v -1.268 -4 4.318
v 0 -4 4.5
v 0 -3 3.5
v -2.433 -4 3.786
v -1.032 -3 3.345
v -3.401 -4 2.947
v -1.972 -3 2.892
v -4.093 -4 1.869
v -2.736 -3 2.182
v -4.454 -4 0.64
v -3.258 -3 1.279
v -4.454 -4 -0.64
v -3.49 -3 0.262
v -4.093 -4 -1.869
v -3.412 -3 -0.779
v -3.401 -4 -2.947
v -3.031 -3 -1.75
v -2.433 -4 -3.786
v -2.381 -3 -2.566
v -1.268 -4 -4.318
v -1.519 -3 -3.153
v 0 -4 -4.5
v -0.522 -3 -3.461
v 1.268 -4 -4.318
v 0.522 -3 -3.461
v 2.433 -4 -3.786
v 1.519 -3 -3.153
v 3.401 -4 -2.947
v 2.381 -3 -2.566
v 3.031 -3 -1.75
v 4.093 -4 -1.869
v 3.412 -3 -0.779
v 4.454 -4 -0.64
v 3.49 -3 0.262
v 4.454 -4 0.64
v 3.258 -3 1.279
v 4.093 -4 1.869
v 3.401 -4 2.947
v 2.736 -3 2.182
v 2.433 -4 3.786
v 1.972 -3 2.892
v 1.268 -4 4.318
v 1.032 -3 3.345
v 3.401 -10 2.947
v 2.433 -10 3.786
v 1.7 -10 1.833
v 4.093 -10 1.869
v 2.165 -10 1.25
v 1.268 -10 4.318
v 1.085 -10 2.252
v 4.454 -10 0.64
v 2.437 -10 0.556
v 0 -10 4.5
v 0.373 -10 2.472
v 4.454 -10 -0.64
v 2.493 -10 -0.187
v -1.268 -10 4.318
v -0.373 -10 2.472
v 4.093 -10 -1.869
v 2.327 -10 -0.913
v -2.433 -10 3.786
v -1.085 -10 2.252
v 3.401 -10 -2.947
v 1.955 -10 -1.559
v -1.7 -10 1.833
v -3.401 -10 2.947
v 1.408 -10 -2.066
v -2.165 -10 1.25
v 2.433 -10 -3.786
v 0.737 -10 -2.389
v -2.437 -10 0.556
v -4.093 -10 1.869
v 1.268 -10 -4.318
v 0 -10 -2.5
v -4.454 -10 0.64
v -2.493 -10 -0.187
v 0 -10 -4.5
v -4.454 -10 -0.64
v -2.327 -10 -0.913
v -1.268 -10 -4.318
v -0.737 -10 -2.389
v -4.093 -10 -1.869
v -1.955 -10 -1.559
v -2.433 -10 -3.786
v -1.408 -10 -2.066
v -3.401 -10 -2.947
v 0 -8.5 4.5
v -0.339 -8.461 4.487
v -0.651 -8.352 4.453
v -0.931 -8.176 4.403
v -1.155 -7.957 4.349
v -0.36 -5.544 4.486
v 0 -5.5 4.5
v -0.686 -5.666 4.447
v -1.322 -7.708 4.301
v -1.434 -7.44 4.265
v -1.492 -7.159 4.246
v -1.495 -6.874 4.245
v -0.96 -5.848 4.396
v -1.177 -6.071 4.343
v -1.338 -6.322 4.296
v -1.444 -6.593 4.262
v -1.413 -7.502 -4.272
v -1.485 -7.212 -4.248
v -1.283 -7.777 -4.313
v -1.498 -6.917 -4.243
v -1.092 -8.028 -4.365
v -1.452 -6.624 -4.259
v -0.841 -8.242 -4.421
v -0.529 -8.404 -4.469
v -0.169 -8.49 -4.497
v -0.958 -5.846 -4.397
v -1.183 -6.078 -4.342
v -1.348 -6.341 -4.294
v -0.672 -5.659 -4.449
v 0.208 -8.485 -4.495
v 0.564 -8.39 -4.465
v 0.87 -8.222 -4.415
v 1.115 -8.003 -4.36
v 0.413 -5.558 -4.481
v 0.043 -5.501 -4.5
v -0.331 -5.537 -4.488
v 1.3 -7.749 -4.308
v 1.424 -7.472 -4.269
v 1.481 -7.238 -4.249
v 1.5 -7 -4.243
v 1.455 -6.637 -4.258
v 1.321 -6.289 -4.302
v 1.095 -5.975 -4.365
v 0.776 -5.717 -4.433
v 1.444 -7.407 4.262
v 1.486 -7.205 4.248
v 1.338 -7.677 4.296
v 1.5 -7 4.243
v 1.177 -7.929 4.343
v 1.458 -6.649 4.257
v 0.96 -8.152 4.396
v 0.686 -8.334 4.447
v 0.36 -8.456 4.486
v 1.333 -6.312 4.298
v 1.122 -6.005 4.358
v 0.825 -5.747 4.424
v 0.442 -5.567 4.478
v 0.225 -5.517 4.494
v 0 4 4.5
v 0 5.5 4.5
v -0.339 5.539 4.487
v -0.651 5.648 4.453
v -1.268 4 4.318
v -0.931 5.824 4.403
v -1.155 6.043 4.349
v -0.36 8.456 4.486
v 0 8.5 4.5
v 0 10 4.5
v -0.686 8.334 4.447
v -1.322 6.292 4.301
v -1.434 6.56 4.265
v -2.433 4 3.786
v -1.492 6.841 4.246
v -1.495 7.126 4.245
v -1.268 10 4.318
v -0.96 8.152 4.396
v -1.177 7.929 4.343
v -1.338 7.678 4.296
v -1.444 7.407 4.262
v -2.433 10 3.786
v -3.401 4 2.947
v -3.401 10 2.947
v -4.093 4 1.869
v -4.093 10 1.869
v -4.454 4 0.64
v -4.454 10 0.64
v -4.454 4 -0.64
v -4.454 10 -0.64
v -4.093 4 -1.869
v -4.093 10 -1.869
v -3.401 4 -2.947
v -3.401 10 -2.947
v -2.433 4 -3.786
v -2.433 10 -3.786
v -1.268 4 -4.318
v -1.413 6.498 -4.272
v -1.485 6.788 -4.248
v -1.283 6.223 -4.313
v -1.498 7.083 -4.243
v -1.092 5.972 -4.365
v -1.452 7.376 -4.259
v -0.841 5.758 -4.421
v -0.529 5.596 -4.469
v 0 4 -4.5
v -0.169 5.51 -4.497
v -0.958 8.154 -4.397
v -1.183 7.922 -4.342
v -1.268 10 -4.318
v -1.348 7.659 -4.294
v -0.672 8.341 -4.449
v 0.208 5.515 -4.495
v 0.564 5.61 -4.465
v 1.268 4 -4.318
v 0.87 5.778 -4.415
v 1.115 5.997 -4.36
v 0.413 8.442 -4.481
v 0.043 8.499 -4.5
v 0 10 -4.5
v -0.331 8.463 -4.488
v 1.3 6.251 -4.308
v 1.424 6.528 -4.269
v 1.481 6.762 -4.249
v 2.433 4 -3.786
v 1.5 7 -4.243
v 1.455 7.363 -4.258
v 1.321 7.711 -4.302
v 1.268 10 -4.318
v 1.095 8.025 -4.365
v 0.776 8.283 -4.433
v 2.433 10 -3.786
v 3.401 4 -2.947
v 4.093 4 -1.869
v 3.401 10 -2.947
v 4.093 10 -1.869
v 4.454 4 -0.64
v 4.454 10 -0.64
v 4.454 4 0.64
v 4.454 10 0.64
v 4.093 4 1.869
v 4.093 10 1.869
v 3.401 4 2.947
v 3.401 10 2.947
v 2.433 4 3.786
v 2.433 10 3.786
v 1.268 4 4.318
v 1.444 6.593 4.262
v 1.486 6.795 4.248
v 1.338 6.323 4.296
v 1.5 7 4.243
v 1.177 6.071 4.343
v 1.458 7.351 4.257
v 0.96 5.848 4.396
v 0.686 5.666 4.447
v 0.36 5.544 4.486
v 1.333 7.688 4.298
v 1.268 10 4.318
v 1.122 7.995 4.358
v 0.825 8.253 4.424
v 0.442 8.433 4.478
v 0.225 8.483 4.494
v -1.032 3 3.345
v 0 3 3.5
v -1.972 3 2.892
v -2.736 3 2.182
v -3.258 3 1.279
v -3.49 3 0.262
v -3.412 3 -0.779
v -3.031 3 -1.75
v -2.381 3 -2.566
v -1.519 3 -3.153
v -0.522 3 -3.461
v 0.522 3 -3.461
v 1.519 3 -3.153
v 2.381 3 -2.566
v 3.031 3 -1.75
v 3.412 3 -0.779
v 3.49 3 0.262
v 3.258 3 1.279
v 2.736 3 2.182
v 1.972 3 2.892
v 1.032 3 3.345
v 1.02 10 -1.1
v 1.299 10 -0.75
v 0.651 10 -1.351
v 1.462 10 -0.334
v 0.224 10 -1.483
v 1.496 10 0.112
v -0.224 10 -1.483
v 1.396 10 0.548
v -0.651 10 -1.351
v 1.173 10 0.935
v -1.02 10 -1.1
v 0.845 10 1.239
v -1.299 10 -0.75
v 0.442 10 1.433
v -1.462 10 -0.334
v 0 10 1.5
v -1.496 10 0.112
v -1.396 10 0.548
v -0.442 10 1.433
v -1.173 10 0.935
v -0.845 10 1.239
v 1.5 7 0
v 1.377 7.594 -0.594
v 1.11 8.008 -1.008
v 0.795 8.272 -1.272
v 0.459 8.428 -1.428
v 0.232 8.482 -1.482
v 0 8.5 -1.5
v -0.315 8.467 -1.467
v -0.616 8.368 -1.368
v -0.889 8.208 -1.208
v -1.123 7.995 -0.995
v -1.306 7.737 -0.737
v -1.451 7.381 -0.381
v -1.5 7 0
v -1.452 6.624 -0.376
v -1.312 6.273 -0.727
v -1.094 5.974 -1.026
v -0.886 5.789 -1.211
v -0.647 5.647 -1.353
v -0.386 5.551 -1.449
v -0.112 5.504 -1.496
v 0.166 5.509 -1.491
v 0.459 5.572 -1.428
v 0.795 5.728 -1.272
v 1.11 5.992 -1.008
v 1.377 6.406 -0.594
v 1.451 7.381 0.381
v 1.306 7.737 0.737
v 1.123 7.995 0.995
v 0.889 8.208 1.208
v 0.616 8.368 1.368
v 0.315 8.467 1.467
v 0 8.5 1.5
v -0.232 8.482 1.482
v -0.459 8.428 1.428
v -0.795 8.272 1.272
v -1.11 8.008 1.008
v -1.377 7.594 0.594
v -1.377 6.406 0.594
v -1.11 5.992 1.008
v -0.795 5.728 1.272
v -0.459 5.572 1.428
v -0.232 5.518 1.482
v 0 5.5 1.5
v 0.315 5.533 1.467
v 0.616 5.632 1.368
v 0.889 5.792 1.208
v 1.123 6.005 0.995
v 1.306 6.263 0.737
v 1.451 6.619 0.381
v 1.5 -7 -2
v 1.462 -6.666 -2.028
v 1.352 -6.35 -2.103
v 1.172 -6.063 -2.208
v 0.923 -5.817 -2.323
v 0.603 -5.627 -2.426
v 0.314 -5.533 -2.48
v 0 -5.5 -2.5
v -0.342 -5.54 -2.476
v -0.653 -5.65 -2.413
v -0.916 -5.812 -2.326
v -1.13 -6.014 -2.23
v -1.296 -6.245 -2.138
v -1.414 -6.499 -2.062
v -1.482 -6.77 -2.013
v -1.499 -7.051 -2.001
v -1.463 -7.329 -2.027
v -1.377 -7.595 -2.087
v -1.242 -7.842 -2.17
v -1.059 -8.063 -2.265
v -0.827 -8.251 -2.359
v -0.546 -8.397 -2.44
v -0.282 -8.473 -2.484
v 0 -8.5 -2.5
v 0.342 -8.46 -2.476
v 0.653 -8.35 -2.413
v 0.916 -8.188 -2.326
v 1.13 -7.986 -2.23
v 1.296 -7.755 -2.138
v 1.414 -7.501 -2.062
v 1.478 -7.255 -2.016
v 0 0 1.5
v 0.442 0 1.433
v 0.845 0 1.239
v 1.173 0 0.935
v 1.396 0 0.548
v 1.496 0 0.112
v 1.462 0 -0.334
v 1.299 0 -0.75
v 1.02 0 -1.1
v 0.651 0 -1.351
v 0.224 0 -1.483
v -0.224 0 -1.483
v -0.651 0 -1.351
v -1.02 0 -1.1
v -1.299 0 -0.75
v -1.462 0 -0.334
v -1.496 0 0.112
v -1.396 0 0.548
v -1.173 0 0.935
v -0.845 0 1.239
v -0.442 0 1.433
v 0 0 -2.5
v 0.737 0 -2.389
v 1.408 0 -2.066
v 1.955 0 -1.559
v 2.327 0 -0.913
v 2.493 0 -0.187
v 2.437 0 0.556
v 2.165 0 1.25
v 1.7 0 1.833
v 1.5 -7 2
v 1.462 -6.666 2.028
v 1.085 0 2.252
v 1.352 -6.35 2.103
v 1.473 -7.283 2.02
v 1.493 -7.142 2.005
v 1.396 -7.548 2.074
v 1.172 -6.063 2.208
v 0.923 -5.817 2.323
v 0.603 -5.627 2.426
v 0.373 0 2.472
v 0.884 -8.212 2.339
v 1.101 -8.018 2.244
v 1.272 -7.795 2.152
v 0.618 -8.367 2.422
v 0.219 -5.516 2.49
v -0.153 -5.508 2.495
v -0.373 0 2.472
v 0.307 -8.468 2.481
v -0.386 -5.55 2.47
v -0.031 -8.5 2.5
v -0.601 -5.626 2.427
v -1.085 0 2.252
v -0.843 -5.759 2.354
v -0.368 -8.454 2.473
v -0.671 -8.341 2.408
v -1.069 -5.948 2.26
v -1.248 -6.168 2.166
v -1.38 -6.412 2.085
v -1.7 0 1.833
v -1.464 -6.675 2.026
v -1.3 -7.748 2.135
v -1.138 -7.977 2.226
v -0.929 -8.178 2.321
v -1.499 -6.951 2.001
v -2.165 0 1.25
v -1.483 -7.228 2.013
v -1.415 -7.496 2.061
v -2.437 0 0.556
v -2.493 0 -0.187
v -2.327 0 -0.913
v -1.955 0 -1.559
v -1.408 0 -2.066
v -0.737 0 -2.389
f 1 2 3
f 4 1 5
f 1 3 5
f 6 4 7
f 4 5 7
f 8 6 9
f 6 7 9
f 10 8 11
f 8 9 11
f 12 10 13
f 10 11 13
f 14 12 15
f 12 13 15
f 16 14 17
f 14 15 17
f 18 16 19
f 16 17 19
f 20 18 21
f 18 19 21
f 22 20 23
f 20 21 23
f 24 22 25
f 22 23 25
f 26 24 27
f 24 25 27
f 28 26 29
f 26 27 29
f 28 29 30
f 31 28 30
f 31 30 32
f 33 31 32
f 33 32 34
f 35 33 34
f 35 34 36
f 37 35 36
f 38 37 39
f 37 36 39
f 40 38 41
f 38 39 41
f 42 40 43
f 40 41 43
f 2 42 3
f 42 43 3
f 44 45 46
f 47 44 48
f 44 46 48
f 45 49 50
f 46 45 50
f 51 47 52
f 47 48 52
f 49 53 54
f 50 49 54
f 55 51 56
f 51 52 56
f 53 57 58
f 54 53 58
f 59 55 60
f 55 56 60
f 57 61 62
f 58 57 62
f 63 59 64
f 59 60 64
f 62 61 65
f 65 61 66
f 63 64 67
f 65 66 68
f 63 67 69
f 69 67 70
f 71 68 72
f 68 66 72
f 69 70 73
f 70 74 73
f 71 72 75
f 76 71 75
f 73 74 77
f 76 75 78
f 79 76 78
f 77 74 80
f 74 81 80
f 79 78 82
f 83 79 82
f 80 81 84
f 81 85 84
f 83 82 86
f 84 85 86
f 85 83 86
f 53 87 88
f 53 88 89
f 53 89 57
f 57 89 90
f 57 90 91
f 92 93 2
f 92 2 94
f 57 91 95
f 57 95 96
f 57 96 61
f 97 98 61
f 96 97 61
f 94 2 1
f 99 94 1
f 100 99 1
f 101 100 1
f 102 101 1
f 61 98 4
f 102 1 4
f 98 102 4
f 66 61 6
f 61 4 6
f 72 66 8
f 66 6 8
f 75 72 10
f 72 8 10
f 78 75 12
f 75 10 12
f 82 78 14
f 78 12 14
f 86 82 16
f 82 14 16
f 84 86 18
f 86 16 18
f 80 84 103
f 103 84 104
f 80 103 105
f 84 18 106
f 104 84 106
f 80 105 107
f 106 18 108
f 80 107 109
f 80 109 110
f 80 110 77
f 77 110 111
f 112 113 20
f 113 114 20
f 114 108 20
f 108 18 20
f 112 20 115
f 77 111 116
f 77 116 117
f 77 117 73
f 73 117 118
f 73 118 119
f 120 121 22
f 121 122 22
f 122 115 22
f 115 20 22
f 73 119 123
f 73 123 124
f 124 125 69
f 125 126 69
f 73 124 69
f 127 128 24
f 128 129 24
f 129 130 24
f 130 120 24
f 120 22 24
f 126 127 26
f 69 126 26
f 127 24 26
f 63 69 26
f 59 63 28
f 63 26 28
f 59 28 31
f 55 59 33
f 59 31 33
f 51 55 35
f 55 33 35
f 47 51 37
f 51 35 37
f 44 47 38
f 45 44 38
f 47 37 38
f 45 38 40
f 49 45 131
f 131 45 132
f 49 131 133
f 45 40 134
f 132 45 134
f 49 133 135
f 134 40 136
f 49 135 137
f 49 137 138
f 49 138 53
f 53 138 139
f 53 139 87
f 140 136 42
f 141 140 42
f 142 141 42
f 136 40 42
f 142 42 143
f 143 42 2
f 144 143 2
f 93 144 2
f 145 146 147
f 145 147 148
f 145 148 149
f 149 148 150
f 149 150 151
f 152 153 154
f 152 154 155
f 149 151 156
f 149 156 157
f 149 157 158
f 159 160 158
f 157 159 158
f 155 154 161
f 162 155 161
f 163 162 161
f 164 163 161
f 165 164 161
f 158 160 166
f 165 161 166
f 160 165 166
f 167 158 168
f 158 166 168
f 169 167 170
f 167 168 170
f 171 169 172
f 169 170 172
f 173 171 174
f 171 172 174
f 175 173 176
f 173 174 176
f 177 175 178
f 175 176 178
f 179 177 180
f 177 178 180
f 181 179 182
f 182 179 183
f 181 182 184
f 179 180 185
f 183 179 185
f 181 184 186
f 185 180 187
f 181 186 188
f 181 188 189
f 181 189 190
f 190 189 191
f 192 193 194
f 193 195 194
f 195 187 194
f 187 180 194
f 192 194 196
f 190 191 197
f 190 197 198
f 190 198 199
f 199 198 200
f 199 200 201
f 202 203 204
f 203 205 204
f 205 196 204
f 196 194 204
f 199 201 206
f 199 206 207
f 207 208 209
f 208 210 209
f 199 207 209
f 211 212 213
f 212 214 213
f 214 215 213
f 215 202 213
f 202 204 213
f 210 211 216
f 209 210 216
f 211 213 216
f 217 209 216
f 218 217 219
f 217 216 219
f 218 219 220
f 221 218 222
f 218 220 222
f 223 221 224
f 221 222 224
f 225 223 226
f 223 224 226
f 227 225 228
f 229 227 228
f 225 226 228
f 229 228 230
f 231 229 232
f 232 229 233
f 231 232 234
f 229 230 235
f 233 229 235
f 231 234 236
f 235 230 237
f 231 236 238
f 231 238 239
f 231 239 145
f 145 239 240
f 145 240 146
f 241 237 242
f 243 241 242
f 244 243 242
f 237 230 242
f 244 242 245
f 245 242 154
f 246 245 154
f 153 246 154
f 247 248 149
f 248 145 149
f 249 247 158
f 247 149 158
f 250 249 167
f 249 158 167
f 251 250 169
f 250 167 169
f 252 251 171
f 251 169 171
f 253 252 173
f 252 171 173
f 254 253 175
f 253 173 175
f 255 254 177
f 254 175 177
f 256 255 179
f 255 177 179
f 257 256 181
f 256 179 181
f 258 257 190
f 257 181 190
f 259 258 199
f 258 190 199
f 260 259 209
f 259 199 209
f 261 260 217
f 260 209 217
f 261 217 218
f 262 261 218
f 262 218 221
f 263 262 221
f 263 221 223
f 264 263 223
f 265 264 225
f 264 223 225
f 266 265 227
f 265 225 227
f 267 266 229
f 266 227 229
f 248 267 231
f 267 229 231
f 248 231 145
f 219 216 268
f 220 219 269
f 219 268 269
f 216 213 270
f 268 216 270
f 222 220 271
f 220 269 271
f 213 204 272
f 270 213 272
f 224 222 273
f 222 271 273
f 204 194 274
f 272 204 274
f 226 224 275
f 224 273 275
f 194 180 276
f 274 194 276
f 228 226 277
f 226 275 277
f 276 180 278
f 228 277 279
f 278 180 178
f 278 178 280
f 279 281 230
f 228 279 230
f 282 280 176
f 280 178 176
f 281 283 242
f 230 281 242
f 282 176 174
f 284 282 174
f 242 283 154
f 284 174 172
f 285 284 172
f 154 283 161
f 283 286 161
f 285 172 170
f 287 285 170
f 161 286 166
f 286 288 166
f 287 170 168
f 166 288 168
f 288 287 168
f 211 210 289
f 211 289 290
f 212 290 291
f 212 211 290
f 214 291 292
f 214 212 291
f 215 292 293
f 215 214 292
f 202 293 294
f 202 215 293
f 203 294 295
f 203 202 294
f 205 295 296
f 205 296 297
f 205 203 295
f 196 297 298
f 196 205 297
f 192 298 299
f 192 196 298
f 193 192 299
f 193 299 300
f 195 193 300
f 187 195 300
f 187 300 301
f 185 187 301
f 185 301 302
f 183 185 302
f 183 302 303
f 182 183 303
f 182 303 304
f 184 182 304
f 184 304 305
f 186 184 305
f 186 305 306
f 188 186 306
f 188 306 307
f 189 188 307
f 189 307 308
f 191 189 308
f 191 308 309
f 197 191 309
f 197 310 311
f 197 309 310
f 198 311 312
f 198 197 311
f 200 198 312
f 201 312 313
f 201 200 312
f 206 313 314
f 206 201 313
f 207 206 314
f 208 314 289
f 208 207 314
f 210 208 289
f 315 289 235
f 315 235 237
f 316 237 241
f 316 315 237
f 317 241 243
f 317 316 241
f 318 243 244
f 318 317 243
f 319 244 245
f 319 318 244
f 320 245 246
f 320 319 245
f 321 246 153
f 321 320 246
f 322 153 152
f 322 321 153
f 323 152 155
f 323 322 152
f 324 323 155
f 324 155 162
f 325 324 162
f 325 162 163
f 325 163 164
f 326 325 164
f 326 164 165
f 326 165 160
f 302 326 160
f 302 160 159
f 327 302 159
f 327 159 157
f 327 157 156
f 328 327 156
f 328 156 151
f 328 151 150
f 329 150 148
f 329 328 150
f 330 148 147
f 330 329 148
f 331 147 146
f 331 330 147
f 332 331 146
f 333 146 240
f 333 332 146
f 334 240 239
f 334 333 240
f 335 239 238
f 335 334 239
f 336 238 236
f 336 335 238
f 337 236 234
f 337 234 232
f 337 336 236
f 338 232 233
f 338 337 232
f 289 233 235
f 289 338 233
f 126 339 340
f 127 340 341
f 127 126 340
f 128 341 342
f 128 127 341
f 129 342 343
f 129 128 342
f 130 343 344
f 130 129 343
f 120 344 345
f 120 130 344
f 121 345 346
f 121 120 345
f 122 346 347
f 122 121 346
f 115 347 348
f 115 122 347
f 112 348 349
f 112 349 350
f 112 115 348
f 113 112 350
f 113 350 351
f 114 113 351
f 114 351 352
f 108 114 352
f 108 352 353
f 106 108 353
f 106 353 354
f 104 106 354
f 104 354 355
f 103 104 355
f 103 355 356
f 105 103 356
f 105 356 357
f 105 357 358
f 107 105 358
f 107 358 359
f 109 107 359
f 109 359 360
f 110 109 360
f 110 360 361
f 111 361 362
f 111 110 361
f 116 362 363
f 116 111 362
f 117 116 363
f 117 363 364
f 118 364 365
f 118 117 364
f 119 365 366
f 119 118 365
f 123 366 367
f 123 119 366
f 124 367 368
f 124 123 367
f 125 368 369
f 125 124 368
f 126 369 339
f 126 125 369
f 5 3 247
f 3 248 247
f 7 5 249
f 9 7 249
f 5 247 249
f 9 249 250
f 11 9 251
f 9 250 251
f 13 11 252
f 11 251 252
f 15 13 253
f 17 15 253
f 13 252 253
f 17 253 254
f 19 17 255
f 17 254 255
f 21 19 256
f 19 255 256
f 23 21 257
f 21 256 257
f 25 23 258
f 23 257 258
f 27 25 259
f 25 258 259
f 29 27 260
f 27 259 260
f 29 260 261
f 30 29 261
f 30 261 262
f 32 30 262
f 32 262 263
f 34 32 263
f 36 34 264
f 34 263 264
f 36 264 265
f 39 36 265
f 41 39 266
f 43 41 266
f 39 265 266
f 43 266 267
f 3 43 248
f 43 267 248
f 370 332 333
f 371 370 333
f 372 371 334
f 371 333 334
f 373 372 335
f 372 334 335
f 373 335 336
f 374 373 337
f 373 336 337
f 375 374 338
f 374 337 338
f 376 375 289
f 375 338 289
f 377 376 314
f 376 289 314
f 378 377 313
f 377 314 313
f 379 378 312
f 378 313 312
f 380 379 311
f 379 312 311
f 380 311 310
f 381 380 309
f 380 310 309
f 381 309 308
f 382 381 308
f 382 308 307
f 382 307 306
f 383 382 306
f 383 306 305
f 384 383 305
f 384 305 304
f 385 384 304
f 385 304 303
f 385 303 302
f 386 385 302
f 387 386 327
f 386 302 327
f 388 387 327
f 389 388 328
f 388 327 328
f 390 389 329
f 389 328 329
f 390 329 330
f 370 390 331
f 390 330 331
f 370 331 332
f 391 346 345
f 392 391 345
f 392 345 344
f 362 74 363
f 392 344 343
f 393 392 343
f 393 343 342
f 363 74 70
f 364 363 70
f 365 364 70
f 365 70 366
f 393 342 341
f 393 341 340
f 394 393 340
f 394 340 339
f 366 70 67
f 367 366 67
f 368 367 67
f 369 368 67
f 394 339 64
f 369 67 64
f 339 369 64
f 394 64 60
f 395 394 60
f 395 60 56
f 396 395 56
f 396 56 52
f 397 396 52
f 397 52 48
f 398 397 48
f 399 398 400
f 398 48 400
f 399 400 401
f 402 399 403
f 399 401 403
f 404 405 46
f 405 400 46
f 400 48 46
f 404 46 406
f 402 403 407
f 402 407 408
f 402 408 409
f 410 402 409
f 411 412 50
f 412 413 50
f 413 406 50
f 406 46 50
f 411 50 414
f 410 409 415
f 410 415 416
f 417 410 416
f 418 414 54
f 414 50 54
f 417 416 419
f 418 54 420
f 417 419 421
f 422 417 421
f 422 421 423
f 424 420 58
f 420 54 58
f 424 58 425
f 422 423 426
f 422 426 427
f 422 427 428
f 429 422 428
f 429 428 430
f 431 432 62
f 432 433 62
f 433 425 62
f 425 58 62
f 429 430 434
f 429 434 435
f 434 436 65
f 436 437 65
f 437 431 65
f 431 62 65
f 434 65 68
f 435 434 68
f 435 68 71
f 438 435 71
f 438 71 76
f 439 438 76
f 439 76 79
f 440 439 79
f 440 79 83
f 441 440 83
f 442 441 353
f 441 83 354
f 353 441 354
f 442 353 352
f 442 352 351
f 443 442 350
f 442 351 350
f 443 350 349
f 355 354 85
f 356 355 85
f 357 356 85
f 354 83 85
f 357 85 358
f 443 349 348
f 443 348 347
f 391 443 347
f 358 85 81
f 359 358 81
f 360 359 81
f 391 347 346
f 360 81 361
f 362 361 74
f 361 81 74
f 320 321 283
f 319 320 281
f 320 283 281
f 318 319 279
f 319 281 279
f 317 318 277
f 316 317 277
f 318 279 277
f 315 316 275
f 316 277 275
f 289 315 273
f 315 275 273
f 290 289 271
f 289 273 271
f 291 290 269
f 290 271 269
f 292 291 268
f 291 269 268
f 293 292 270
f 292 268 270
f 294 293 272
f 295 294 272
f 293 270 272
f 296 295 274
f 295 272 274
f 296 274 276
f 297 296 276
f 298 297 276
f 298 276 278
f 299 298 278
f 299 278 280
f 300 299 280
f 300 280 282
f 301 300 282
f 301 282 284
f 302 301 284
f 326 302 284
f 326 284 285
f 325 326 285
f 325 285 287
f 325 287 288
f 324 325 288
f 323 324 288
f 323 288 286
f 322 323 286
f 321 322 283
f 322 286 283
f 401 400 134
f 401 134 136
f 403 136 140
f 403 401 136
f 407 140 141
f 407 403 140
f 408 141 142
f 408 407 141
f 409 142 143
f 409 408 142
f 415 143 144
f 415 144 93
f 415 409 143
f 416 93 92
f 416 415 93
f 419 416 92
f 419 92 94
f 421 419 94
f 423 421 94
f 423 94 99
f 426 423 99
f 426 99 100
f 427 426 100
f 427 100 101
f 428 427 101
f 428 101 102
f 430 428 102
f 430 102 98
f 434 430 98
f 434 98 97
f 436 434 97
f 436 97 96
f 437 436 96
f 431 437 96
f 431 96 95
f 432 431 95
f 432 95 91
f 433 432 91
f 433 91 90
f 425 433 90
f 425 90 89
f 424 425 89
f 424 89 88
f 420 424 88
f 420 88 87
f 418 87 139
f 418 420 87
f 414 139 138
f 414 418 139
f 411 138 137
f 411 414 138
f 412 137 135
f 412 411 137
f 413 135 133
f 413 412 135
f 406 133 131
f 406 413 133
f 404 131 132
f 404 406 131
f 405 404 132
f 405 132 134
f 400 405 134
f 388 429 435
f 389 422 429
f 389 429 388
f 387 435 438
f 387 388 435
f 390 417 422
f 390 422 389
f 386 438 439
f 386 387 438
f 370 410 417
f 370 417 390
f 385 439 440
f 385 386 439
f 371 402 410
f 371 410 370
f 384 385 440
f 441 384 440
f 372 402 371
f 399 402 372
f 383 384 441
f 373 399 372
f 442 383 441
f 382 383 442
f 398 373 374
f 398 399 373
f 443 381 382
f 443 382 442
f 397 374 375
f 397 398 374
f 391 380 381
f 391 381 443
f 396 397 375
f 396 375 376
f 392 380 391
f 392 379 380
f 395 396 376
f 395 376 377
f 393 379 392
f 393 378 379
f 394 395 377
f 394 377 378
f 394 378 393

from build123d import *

# Parameters (mm, degrees)
SKETCH2_R               = 1.5
CUT_EXTRUDE1_DEPTH      = 21.988091862
SKETCH3_R               = 2.5
CUT_EXTRUDE2_DEPTH      = 10
CUT_EXTRUDE3_DEPTH      = 12.853269591
CUT_EXTRUDE3_DEPTH_BACK = 12.853269591
SKETCH4_R               = 1.5


with BuildPart() as part:
    # Sketch1 → Revolve1 (revolve)
    with BuildSketch(Plane.XY, mode=Mode.PRIVATE) as revolve1_sk:
        Polygon((3.5, -3), (3.5, 3), (4.5, 4), (4.5, 10), (0, 10), (0, -10), (4.5, -10), (4.5, -4), align=None)
    revolve(revolve1_sk.sketch.rotate(Axis((0, 10, 0), (0, -1, 0)), 90), axis=Axis((0, 10, 0), (0, -1, 0)))

    # Sketch2 → Cut-Extrude1 (cut, through all)
    with BuildSketch(Plane(origin=(0, 10, 0), x_dir=(1, 0, 0), z_dir=(0, 1, 0))):
        with Locations(Location((0, 0, 0), (0, 0, 270))):
            Circle(SKETCH2_R)
    extrude(amount=-CUT_EXTRUDE1_DEPTH, mode=Mode.SUBTRACT)

    # Sketch3 → Cut-Extrude2 (cut)
    with BuildSketch(Plane.XZ.offset(10)):
        with Locations(Location((0, 0, 0), (0, 0, 270))):
            Circle(SKETCH3_R)
    extrude(amount=-CUT_EXTRUDE2_DEPTH, mode=Mode.SUBTRACT)

    # Sketch4 → Cut-Extrude3 (cut, two sides: drawn at the far end of the back side and taken through both)
    with BuildSketch(Plane.XY.offset(-CUT_EXTRUDE3_DEPTH_BACK)):
        with Locations((0, 7)):
            Circle(SKETCH4_R)
        with Locations((0, -7)):
            Circle(SKETCH4_R)
    extrude(amount=CUT_EXTRUDE3_DEPTH + CUT_EXTRUDE3_DEPTH_BACK, mode=Mode.SUBTRACT)


solid = part.part
